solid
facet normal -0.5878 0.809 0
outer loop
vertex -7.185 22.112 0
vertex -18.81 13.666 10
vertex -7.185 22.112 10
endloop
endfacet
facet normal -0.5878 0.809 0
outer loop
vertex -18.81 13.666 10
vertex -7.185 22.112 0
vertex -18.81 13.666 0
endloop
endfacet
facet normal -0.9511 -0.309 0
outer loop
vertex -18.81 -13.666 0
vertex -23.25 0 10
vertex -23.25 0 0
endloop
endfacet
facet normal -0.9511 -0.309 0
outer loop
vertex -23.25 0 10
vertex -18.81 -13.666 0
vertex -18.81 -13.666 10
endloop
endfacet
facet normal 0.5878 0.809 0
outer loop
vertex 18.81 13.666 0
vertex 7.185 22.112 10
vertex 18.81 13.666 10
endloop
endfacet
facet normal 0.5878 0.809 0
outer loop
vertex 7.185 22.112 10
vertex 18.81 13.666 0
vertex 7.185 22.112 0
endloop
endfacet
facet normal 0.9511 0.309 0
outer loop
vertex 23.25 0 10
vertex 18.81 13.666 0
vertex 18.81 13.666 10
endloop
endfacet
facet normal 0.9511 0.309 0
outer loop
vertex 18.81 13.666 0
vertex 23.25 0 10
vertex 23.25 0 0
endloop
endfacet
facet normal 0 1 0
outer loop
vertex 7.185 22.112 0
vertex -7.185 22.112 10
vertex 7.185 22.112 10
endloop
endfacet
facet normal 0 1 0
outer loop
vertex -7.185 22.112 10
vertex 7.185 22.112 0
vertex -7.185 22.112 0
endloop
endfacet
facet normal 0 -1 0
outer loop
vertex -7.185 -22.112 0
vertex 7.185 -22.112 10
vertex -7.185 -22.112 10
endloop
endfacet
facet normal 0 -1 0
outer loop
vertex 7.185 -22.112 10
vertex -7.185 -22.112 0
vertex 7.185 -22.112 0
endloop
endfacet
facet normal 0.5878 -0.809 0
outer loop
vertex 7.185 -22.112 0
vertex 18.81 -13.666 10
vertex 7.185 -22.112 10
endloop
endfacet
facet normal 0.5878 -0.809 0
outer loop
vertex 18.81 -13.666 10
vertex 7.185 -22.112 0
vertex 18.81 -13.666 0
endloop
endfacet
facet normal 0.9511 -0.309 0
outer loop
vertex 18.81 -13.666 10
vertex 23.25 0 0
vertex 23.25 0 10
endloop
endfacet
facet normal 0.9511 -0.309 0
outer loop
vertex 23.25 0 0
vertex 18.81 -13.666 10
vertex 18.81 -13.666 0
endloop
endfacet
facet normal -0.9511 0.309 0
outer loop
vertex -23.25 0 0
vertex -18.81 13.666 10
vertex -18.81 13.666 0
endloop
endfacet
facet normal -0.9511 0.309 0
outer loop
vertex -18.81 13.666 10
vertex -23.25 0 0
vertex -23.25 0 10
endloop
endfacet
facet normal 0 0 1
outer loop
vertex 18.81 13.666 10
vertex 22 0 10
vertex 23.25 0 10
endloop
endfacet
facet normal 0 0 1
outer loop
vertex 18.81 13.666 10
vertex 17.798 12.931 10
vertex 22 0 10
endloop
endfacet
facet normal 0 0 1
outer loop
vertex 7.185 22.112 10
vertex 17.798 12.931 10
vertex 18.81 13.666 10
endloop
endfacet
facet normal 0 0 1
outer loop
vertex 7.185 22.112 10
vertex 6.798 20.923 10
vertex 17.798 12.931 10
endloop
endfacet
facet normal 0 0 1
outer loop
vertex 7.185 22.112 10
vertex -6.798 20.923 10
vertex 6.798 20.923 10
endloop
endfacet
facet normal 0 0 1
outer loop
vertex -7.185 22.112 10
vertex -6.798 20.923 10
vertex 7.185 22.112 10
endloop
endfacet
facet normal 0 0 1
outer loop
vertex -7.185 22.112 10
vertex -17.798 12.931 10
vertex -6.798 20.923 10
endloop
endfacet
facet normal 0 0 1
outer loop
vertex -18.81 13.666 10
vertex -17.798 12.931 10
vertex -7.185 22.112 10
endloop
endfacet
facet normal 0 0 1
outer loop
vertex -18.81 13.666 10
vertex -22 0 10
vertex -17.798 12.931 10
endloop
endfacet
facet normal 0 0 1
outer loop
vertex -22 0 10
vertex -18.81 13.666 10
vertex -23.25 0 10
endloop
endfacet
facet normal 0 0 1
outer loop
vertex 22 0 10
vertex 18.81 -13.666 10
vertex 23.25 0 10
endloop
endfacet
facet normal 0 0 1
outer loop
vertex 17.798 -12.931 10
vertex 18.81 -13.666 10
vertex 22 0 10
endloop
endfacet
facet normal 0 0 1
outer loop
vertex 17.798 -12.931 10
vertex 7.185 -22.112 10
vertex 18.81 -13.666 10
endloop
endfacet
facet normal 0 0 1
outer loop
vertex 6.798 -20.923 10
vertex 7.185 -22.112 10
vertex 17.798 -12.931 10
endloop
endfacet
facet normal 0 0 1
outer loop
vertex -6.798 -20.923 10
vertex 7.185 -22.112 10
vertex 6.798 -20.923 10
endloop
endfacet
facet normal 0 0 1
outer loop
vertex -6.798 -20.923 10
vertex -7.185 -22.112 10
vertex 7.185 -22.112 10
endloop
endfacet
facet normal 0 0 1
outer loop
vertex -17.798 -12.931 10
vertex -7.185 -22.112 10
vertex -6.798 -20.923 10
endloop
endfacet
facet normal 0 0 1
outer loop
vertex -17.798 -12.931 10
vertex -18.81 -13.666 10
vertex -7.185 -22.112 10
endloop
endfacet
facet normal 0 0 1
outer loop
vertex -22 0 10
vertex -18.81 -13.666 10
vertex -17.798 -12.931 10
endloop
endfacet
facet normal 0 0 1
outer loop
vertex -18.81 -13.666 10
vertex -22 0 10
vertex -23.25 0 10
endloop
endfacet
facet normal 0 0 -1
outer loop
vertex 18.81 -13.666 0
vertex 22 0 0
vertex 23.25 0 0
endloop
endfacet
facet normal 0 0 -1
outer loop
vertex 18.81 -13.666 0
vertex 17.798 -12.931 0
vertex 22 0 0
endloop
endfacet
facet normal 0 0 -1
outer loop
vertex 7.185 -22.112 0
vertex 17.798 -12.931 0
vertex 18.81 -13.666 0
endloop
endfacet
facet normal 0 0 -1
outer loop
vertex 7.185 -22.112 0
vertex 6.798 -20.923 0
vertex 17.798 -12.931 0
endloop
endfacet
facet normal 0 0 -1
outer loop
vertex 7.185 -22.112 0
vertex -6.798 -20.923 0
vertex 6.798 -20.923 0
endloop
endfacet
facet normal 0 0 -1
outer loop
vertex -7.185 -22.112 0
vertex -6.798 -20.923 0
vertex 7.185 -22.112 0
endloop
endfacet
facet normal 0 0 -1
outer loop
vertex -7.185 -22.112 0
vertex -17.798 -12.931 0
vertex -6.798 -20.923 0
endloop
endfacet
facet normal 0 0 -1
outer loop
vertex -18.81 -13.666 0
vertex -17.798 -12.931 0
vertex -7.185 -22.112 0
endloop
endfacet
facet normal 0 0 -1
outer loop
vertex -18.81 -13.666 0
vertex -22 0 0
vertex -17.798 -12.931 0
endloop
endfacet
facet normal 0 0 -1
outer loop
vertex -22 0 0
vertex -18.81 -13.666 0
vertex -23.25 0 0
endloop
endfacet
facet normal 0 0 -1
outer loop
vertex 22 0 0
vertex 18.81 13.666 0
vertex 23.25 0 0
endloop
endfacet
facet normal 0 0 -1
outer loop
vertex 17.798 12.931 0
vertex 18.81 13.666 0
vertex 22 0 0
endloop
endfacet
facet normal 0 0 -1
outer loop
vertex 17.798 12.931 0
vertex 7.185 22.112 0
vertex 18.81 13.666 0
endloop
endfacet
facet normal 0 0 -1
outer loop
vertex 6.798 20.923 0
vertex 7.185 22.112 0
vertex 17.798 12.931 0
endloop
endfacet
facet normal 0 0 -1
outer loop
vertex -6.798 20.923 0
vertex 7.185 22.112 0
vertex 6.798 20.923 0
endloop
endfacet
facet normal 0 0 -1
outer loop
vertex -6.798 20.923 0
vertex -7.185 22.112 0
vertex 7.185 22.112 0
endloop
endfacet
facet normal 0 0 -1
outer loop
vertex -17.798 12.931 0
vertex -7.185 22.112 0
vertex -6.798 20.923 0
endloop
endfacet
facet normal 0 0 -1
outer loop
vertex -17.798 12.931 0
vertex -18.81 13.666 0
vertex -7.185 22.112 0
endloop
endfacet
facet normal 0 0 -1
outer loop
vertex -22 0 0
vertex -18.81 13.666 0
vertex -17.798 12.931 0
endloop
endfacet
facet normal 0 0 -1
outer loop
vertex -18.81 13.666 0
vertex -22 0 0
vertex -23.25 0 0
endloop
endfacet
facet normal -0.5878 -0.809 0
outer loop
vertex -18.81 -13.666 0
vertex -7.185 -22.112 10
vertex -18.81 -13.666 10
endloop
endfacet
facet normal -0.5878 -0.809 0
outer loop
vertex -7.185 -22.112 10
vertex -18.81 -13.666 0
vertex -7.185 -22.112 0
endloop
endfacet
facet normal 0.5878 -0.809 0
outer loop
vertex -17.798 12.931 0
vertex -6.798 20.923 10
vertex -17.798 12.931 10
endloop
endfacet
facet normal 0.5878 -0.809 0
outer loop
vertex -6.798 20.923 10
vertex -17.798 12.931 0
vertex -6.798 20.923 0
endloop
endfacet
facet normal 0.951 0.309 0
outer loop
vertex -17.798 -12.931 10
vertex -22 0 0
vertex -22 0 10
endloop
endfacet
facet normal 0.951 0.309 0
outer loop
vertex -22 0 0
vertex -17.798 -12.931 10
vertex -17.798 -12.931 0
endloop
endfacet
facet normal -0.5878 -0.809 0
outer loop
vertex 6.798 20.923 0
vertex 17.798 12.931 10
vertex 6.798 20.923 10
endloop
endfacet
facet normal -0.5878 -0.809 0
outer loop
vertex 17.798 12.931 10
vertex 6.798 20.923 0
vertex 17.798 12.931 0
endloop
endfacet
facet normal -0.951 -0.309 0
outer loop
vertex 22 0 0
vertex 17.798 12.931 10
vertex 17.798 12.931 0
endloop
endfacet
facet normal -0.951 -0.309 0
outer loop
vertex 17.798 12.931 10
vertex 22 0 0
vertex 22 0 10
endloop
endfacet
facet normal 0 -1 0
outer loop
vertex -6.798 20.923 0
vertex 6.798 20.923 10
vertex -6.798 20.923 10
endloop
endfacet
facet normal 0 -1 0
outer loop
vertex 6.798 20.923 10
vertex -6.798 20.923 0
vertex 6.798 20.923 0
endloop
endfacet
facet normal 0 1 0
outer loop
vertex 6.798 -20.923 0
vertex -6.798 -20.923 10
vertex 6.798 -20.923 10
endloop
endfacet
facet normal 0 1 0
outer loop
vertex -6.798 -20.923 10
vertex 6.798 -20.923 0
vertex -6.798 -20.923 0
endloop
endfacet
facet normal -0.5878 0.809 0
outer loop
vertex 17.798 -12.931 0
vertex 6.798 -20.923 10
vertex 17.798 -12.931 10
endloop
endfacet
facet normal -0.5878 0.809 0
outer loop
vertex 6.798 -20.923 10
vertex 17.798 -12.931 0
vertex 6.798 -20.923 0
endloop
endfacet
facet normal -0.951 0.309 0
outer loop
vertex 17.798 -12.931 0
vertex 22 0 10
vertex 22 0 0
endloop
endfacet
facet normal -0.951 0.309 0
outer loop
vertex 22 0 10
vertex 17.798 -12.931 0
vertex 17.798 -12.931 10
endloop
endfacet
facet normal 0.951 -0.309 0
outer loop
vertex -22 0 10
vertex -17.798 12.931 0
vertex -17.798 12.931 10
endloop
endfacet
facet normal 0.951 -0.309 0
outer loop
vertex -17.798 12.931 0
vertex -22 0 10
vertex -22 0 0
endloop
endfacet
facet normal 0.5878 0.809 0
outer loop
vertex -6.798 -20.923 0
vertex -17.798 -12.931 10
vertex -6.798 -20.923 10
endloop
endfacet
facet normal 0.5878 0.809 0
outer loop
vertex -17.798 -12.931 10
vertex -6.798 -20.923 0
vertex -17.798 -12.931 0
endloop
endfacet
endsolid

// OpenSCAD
difference() {cylinder(d = 46.5, h = 10, $fn = 10);cylinder(d = 44, h=12, $fn = 10);}
First_Char = "1";
Second_Char = "2";
Third_Char = "3";
Fourth_Char = "4";
Fifth_Char = "5";
Sixth_Char = "6";
Seventh_Char = "7";
Eighth_Char = "8";
Ninth_Char = "9";
Tenth_Char = "10";
translate([2,22.5,2.5]){
    rotate([90,0,180]){text(First_Char, 5);}
}
//text(t, size, font, halign, valign, spacing, direction, language, script)
